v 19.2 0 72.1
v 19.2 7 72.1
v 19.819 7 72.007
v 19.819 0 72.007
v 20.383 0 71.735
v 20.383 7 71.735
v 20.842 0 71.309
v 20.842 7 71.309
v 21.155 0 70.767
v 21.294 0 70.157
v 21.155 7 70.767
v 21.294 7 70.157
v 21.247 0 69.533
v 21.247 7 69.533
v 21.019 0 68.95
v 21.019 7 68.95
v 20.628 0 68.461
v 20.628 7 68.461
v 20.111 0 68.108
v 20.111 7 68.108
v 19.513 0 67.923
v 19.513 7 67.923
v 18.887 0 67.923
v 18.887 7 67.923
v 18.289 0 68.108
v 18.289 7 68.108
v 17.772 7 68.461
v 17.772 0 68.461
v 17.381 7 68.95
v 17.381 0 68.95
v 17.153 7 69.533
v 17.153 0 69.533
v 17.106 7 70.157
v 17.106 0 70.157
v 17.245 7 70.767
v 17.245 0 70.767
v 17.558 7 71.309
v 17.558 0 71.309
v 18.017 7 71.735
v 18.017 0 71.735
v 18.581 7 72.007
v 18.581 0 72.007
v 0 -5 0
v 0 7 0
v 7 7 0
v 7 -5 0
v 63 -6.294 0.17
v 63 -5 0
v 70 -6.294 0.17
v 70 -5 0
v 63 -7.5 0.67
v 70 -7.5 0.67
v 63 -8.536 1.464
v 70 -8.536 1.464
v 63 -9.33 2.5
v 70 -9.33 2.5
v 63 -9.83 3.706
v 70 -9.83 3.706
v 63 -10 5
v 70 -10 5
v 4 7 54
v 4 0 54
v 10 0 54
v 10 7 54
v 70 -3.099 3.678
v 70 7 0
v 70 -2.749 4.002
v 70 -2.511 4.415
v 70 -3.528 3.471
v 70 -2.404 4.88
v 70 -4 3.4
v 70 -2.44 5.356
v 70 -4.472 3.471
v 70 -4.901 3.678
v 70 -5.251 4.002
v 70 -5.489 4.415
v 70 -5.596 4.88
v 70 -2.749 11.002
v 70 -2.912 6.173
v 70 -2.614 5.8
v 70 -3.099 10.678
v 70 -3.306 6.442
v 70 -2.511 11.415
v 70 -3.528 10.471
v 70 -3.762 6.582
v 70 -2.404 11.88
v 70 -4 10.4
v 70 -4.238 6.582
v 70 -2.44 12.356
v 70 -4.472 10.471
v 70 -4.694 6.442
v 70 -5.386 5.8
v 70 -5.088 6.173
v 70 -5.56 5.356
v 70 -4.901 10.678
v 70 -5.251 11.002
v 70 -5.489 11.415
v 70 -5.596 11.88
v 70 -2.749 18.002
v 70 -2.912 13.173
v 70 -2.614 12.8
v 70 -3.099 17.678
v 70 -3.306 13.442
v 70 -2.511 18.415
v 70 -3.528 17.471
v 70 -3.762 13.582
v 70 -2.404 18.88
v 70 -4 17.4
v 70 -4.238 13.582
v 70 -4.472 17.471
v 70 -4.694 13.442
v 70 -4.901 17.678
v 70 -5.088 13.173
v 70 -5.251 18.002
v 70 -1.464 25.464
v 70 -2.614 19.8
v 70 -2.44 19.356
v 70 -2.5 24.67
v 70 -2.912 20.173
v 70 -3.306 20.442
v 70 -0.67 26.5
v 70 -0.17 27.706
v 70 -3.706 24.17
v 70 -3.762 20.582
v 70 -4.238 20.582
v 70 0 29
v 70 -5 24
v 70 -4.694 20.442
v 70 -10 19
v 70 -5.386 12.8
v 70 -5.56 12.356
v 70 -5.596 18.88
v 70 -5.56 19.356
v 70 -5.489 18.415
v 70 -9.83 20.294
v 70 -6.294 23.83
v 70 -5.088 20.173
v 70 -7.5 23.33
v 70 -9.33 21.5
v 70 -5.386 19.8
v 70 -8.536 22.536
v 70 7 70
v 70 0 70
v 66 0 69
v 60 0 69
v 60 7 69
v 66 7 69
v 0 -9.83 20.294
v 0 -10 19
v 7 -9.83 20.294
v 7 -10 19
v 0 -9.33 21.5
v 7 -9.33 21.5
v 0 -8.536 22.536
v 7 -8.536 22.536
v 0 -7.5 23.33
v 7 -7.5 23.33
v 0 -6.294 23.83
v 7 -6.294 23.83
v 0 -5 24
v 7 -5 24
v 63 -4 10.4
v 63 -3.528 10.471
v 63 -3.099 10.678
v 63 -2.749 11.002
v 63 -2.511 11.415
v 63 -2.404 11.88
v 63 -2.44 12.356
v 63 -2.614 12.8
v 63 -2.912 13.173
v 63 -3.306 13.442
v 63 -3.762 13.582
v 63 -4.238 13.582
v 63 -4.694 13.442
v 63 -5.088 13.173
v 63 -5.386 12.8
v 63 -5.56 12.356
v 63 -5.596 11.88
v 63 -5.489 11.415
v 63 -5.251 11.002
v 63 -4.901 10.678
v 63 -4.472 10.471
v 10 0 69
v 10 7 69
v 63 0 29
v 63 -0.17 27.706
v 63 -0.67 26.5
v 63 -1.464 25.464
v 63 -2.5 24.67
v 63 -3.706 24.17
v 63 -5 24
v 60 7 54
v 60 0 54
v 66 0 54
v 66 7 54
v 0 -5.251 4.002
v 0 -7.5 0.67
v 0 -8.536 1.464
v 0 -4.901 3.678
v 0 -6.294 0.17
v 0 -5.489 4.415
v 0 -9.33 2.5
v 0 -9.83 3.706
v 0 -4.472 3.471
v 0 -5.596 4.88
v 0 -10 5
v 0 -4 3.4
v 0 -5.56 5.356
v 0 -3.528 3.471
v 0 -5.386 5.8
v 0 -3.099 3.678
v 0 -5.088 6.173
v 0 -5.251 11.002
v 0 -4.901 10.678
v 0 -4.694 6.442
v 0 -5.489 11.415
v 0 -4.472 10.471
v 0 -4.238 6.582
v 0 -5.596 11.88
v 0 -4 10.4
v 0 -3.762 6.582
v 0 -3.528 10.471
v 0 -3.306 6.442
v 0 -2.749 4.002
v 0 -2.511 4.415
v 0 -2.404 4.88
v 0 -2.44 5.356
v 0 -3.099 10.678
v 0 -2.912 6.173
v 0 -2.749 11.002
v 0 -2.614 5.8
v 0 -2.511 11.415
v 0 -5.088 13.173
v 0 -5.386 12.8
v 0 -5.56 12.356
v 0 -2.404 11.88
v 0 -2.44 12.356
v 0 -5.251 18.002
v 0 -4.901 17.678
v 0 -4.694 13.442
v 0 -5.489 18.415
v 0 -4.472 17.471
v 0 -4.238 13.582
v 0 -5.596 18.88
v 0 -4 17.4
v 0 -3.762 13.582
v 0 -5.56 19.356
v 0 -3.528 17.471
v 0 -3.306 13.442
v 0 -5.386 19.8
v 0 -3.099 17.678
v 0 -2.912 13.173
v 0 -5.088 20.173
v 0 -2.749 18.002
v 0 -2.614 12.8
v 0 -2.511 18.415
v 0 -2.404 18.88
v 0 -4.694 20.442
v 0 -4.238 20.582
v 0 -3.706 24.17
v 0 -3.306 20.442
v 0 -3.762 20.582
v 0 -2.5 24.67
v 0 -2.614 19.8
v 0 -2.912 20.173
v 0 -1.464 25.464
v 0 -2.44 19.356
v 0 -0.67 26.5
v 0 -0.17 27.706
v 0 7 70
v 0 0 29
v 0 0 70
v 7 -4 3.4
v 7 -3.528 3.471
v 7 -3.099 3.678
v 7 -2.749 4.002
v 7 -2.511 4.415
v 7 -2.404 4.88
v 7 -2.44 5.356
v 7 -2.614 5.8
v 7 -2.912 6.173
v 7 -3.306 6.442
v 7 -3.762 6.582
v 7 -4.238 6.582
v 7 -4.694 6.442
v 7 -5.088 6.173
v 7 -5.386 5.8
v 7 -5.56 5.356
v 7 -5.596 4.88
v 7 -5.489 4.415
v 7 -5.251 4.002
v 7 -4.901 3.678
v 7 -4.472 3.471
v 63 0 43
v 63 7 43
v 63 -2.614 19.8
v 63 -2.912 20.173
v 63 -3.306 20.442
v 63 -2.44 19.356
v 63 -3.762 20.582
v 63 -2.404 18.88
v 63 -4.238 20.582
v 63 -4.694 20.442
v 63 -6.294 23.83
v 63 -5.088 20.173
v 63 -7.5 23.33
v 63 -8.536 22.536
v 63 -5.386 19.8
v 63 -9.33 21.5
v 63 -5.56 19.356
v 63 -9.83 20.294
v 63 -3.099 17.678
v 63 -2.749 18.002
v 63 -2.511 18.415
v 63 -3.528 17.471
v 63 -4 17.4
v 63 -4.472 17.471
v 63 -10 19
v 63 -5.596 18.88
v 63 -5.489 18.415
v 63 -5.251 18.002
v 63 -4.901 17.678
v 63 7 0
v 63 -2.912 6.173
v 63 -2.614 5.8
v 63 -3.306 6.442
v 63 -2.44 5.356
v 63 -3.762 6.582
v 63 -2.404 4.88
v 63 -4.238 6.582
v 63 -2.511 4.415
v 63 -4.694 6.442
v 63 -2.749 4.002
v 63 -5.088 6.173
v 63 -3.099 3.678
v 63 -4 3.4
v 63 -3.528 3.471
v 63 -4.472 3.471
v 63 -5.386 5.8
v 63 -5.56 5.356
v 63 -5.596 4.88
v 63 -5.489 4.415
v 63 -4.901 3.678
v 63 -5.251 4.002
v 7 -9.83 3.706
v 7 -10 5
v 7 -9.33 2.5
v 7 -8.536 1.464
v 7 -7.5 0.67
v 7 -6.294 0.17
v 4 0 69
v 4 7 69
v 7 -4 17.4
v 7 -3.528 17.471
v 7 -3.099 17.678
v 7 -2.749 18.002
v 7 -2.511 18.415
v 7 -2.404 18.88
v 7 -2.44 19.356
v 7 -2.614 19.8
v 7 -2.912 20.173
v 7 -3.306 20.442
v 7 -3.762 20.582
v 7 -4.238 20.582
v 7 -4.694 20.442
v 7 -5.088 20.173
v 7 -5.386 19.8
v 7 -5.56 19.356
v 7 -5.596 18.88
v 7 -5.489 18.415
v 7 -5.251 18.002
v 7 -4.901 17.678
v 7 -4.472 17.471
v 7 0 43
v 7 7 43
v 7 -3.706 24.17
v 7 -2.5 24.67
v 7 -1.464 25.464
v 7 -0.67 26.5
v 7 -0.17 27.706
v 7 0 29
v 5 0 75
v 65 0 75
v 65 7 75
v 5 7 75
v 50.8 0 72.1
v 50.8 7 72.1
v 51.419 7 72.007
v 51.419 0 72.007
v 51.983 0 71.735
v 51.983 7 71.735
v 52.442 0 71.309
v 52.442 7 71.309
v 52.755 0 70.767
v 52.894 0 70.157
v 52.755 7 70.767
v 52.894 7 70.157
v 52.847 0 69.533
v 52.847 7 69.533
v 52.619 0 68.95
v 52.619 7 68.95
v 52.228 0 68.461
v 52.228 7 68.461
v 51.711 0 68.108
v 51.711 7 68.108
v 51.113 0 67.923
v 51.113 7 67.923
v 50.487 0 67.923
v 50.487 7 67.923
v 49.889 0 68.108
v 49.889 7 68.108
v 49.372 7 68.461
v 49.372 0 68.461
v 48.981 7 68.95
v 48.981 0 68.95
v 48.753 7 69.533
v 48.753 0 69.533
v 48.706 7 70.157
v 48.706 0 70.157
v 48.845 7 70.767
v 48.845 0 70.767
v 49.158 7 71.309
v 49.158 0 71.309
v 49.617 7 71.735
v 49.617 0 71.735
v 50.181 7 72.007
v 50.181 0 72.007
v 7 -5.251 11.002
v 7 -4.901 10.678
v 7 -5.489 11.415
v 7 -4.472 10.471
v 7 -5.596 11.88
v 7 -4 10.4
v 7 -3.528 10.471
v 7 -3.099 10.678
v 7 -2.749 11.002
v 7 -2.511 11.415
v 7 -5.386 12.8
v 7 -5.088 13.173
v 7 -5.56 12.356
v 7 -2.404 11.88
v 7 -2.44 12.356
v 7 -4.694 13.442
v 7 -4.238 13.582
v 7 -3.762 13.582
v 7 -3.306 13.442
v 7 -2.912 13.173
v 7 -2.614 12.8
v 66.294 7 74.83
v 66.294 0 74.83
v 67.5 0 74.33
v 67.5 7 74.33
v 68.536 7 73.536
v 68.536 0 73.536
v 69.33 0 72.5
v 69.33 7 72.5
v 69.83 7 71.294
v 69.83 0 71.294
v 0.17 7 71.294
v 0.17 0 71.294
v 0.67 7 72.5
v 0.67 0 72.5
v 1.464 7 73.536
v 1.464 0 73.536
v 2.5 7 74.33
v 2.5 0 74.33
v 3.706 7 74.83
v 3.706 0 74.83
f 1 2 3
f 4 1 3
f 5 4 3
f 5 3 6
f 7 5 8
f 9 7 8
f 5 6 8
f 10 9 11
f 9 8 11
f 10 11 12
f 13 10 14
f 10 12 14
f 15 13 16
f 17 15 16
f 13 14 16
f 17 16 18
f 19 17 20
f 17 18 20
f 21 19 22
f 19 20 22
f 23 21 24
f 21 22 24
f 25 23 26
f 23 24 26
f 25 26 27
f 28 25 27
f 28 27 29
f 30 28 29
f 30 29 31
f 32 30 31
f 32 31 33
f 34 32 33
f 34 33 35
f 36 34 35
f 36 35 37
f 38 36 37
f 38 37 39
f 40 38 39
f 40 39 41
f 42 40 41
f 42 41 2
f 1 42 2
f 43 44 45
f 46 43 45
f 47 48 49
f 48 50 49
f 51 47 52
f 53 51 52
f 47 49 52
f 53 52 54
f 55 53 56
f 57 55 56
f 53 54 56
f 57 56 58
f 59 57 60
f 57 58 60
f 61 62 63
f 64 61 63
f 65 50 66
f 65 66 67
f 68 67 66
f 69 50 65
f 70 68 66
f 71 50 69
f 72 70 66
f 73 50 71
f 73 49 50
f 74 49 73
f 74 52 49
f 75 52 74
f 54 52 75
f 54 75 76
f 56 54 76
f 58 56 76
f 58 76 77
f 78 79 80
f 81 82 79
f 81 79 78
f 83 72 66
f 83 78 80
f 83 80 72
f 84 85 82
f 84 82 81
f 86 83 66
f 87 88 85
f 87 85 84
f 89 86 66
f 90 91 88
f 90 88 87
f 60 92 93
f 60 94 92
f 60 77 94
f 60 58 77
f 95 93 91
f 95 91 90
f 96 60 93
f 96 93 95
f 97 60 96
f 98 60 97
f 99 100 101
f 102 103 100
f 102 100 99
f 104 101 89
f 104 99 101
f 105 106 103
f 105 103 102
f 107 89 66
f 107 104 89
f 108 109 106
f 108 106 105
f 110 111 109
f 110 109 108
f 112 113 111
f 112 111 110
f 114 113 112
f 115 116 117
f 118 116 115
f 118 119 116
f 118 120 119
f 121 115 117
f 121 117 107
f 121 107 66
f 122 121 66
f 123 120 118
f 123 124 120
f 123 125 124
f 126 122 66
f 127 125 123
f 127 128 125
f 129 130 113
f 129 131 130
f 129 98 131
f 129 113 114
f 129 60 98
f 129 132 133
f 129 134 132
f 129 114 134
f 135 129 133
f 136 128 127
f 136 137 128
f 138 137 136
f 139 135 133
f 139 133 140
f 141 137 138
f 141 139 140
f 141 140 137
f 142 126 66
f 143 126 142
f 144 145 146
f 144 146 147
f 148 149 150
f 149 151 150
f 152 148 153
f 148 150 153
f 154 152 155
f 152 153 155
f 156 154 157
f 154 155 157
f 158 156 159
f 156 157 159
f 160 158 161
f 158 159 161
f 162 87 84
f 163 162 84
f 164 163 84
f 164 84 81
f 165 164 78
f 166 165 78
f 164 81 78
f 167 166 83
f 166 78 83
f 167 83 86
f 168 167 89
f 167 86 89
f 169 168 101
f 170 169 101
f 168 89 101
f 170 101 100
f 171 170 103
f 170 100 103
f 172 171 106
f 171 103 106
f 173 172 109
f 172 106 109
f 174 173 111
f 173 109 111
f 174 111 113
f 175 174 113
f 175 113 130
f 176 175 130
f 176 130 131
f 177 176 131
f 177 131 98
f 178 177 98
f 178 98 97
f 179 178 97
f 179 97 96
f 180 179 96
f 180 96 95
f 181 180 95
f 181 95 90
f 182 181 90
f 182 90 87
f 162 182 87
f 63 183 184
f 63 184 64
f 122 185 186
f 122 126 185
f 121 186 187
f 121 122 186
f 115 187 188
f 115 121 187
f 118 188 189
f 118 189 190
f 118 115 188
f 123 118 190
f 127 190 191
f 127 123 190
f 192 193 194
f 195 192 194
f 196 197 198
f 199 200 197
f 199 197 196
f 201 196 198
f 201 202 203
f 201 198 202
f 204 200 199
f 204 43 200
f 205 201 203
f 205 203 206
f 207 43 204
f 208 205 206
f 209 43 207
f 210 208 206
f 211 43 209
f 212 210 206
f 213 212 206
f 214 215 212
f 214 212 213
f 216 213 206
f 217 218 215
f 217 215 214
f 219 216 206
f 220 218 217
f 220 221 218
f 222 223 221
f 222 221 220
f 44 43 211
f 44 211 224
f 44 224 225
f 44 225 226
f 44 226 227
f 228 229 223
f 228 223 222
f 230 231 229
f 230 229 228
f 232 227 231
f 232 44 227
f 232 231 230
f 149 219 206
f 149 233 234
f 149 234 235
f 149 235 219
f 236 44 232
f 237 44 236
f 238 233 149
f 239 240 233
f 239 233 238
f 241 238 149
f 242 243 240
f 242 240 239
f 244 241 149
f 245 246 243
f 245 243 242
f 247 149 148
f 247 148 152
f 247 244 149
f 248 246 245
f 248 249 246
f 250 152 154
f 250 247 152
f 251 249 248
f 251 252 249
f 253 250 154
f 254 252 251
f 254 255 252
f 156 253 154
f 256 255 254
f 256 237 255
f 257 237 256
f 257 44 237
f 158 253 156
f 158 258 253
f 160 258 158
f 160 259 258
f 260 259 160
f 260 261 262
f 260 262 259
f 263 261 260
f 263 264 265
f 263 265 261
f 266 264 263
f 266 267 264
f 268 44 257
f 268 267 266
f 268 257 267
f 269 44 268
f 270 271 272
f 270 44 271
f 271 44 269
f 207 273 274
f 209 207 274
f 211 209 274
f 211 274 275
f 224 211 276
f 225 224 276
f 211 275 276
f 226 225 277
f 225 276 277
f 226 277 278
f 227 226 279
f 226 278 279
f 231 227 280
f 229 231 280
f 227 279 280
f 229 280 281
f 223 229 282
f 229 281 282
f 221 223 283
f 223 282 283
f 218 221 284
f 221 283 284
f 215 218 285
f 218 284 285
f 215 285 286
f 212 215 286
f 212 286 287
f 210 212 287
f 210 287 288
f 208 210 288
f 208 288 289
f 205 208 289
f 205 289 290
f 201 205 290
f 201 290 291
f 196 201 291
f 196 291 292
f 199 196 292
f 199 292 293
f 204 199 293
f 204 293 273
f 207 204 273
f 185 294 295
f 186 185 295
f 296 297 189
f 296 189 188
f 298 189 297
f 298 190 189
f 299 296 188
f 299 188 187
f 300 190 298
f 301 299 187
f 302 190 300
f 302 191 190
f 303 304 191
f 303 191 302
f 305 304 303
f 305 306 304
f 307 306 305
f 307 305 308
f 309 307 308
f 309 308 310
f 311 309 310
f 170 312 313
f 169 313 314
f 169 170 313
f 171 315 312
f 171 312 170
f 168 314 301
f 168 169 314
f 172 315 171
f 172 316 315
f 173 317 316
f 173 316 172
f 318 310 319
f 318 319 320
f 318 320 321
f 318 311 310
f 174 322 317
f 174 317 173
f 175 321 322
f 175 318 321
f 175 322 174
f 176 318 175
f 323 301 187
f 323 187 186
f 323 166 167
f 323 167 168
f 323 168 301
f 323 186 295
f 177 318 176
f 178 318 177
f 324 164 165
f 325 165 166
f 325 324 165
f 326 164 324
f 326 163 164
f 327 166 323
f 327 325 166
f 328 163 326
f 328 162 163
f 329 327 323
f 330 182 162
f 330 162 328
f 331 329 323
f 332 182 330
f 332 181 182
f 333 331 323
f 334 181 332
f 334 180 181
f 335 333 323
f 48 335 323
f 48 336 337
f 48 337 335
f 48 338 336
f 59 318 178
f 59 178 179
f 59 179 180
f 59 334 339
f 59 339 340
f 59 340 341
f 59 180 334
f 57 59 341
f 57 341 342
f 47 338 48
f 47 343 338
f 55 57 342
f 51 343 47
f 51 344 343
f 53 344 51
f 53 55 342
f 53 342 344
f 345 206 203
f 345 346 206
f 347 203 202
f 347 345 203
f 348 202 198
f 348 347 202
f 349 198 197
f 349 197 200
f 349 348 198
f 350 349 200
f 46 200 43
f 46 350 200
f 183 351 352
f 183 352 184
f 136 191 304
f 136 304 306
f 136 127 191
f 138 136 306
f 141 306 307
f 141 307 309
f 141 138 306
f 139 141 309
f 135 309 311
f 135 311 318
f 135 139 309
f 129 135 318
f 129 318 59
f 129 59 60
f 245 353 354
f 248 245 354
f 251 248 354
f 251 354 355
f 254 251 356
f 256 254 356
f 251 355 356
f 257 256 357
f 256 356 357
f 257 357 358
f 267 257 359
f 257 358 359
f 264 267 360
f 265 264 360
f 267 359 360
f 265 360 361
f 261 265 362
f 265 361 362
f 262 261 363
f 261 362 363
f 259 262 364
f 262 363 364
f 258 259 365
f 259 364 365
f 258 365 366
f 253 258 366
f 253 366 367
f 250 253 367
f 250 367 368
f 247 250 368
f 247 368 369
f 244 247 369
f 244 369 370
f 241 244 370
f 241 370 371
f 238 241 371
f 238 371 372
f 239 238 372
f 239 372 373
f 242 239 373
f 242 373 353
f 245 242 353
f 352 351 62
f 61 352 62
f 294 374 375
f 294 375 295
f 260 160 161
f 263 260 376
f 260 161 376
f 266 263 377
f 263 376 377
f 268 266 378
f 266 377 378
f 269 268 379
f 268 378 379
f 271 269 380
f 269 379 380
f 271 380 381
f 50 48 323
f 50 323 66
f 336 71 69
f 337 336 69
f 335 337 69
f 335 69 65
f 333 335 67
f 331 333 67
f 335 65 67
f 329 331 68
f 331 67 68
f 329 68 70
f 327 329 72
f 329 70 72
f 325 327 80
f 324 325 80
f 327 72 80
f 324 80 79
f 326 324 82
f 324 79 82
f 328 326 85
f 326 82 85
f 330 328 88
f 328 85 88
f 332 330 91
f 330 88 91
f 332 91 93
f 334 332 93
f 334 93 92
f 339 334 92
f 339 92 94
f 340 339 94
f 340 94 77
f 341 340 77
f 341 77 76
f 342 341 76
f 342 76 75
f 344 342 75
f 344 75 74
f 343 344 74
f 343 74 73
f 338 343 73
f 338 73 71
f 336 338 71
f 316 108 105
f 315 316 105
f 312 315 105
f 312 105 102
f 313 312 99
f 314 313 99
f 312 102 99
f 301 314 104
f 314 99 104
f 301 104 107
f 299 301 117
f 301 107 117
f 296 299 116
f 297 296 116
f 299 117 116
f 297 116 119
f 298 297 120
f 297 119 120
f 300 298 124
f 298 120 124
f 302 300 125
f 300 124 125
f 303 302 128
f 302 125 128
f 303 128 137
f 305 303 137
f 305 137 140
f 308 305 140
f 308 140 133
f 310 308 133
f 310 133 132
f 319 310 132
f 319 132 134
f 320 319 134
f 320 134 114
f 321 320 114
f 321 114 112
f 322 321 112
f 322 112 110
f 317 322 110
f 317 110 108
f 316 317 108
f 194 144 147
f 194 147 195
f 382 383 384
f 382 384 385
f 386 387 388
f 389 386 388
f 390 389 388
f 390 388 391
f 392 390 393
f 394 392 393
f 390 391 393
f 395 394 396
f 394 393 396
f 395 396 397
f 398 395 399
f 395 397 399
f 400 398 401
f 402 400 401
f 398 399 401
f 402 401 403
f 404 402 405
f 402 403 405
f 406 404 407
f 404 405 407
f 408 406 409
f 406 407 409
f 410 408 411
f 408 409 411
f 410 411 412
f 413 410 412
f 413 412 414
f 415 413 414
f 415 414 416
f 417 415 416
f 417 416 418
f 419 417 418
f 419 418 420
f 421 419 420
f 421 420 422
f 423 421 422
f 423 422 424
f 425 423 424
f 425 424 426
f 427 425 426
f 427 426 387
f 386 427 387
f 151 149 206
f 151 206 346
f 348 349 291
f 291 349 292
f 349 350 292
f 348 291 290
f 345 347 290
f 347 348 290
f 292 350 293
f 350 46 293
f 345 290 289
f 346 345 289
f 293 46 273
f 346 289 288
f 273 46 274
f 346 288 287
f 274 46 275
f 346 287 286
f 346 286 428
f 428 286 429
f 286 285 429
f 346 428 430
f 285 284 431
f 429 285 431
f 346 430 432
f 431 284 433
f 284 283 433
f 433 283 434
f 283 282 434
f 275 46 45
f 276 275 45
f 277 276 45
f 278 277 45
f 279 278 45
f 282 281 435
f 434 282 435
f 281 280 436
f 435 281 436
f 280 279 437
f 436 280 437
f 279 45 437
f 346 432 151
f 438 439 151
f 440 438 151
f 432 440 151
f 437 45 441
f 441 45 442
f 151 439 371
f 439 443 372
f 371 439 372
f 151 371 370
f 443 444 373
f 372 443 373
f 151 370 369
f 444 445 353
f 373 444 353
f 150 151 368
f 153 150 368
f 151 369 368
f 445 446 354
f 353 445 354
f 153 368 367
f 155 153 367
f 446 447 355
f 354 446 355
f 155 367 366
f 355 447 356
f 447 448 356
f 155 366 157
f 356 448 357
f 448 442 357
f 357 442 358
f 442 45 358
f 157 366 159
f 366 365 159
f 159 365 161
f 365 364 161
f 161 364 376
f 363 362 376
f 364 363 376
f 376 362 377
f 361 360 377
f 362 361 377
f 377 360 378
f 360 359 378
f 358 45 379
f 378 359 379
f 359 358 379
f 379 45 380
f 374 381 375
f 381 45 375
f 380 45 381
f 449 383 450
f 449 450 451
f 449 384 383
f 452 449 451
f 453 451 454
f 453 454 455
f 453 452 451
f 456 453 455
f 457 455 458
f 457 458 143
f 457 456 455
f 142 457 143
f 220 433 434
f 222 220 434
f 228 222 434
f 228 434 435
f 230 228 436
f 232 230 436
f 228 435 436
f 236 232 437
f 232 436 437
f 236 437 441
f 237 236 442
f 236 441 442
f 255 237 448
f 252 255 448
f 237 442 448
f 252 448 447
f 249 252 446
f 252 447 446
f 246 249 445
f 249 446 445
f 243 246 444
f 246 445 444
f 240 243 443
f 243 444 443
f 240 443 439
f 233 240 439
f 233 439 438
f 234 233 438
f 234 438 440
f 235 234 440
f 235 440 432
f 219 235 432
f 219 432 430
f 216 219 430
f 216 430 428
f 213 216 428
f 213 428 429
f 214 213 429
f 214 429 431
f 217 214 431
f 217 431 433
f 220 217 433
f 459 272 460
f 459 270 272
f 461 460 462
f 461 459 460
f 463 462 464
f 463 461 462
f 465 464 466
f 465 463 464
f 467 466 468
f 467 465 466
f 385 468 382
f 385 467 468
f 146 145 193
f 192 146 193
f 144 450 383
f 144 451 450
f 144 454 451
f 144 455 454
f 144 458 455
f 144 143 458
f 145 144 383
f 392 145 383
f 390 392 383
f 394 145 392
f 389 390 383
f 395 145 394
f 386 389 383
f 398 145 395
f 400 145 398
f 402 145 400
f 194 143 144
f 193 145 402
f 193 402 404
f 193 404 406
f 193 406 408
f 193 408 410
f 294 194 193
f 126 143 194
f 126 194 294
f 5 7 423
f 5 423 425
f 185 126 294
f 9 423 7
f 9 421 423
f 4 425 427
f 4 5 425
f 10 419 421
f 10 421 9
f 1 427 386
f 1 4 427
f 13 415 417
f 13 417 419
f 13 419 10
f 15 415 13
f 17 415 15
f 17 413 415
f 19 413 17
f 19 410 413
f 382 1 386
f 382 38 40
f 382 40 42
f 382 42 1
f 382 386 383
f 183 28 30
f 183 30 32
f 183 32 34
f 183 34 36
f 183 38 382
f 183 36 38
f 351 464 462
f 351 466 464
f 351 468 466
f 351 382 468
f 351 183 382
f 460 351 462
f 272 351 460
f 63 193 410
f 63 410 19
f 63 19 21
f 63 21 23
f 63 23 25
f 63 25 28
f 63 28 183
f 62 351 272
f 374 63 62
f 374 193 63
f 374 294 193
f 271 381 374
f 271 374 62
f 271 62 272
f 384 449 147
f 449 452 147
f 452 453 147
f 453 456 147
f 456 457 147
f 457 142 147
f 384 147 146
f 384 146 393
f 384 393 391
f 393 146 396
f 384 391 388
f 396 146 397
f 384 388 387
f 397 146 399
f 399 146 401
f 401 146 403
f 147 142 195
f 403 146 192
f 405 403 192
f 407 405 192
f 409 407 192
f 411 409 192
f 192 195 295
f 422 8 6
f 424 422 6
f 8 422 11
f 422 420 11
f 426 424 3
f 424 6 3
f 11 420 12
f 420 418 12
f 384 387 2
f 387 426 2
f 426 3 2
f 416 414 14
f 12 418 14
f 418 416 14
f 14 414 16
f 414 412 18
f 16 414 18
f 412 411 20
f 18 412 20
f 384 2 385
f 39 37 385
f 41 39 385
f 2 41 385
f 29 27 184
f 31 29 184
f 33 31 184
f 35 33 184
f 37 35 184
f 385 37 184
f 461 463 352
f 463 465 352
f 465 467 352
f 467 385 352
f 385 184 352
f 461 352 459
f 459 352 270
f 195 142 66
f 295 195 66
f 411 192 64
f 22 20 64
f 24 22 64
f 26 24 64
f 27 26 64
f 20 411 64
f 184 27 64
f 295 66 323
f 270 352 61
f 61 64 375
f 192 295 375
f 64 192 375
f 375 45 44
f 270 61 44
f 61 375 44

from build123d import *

# Parameters (mm, degrees)
SKETCH_1_W          = 6
SKETCH_1_H          = 15
EXTRUDE_1_DEPTH     = 7
SKETCH_2_W          = 7
SKETCH_2_H          = 24
EXTRUDE_2_DEPTH     = 10
SKETCH_3_R          = 1.6
CUT_EXTRUDE_1_DEPTH = 104.07764064
CUT_EXTRUDE_2_REACH = 105.99
SKETCH_7_R          = 2.1
FILLET_1_R          = 5


with BuildPart() as part:
    # 草图1 → 凸台-拉伸1 (new body)
    with BuildSketch(Plane(origin=(0, 0, 0), x_dir=(1, 0, 0), z_dir=(0, 1, 0))):
        Polygon((7, -43), (63, -43), (63, 0), (70, 0), (70, -75), (0, -75), (0, 0), (7, 0), align=None)
        with Locations((63, -61.5)):
            Rectangle(SKETCH_1_W, SKETCH_1_H, mode=Mode.SUBTRACT)
        with Locations((7, -61.5)):
            Rectangle(SKETCH_1_W, SKETCH_1_H, mode=Mode.SUBTRACT)
    extrude(amount=EXTRUDE_1_DEPTH)

    # 草图2 → 凸台-拉伸2 (add)
    with BuildSketch(Plane.XZ):
        with Locations((3.5, 12)):
            Rectangle(SKETCH_2_W, SKETCH_2_H)
        with Locations((66.5, 12)):
            Rectangle(SKETCH_2_W, SKETCH_2_H)
    extrude(amount=EXTRUDE_2_DEPTH)

    # 草图3 → 切除-拉伸1 (cut, through all)
    with BuildSketch(Plane(origin=(70, 0, 0), x_dir=(0, 0, -1), z_dir=(1, 0, 0))):
        with Locations((-12, -4)):
            Circle(SKETCH_3_R)
        with Locations((-19, -4)):
            Circle(SKETCH_3_R)
        with Locations((-5, -4)):
            Circle(SKETCH_3_R)
    extrude(amount=-CUT_EXTRUDE_1_DEPTH, mode=Mode.SUBTRACT)

    # 草图7 → 切除-拉伸2 (cut, up to next)
    with BuildSketch(Plane(origin=(0, 7, 0), x_dir=(1, 0, 0), z_dir=(0, 1, 0)), mode=Mode.PRIVATE) as cut_extrude_2_sk1:
        with Locations(Location((19.2, -70, 0), (0, 0, 270))):
            Circle(SKETCH_7_R)
    cut_extrude_2_tool1 = extrude(cut_extrude_2_sk1.sketch, amount=-CUT_EXTRUDE_2_REACH, mode=Mode.PRIVATE) & part.part
    # 草图7 → 切除-拉伸2 (cut, up to next)
    with BuildSketch(Plane(origin=(0, 7, 0), x_dir=(1, 0, 0), z_dir=(0, 1, 0)), mode=Mode.PRIVATE) as cut_extrude_2_sk2:
        with Locations(Location((50.8, -70, 0), (0, 0, 270))):
            Circle(SKETCH_7_R)
    cut_extrude_2_tool2 = extrude(cut_extrude_2_sk2.sketch, amount=-CUT_EXTRUDE_2_REACH, mode=Mode.PRIVATE) & part.part
    add(cut_extrude_2_tool1.solids().sort_by_distance((19.2, 7, 70))[0], mode=Mode.SUBTRACT)
    add(cut_extrude_2_tool2.solids().sort_by_distance((50.8, 7, 70))[0], mode=Mode.SUBTRACT)

    # 圆角1
    fillet_1_edges = [part.edges().sort_by_distance(p)[0] for p in [
        (70, 3.5, 75),
        (0, 3.5, 75),
        (66.5, -10, 24),
        (66.5, 0, 24),
        (66.5, -10, 0),
        (3.5, -10, 0),
        (3.5, -10, 24),
        (3.5, 0, 24),
    ]]
    fillet(fillet_1_edges, radius=FILLET_1_R - 0.0001)  # a hair under: the kernel refuses the full size


solid = part.part
